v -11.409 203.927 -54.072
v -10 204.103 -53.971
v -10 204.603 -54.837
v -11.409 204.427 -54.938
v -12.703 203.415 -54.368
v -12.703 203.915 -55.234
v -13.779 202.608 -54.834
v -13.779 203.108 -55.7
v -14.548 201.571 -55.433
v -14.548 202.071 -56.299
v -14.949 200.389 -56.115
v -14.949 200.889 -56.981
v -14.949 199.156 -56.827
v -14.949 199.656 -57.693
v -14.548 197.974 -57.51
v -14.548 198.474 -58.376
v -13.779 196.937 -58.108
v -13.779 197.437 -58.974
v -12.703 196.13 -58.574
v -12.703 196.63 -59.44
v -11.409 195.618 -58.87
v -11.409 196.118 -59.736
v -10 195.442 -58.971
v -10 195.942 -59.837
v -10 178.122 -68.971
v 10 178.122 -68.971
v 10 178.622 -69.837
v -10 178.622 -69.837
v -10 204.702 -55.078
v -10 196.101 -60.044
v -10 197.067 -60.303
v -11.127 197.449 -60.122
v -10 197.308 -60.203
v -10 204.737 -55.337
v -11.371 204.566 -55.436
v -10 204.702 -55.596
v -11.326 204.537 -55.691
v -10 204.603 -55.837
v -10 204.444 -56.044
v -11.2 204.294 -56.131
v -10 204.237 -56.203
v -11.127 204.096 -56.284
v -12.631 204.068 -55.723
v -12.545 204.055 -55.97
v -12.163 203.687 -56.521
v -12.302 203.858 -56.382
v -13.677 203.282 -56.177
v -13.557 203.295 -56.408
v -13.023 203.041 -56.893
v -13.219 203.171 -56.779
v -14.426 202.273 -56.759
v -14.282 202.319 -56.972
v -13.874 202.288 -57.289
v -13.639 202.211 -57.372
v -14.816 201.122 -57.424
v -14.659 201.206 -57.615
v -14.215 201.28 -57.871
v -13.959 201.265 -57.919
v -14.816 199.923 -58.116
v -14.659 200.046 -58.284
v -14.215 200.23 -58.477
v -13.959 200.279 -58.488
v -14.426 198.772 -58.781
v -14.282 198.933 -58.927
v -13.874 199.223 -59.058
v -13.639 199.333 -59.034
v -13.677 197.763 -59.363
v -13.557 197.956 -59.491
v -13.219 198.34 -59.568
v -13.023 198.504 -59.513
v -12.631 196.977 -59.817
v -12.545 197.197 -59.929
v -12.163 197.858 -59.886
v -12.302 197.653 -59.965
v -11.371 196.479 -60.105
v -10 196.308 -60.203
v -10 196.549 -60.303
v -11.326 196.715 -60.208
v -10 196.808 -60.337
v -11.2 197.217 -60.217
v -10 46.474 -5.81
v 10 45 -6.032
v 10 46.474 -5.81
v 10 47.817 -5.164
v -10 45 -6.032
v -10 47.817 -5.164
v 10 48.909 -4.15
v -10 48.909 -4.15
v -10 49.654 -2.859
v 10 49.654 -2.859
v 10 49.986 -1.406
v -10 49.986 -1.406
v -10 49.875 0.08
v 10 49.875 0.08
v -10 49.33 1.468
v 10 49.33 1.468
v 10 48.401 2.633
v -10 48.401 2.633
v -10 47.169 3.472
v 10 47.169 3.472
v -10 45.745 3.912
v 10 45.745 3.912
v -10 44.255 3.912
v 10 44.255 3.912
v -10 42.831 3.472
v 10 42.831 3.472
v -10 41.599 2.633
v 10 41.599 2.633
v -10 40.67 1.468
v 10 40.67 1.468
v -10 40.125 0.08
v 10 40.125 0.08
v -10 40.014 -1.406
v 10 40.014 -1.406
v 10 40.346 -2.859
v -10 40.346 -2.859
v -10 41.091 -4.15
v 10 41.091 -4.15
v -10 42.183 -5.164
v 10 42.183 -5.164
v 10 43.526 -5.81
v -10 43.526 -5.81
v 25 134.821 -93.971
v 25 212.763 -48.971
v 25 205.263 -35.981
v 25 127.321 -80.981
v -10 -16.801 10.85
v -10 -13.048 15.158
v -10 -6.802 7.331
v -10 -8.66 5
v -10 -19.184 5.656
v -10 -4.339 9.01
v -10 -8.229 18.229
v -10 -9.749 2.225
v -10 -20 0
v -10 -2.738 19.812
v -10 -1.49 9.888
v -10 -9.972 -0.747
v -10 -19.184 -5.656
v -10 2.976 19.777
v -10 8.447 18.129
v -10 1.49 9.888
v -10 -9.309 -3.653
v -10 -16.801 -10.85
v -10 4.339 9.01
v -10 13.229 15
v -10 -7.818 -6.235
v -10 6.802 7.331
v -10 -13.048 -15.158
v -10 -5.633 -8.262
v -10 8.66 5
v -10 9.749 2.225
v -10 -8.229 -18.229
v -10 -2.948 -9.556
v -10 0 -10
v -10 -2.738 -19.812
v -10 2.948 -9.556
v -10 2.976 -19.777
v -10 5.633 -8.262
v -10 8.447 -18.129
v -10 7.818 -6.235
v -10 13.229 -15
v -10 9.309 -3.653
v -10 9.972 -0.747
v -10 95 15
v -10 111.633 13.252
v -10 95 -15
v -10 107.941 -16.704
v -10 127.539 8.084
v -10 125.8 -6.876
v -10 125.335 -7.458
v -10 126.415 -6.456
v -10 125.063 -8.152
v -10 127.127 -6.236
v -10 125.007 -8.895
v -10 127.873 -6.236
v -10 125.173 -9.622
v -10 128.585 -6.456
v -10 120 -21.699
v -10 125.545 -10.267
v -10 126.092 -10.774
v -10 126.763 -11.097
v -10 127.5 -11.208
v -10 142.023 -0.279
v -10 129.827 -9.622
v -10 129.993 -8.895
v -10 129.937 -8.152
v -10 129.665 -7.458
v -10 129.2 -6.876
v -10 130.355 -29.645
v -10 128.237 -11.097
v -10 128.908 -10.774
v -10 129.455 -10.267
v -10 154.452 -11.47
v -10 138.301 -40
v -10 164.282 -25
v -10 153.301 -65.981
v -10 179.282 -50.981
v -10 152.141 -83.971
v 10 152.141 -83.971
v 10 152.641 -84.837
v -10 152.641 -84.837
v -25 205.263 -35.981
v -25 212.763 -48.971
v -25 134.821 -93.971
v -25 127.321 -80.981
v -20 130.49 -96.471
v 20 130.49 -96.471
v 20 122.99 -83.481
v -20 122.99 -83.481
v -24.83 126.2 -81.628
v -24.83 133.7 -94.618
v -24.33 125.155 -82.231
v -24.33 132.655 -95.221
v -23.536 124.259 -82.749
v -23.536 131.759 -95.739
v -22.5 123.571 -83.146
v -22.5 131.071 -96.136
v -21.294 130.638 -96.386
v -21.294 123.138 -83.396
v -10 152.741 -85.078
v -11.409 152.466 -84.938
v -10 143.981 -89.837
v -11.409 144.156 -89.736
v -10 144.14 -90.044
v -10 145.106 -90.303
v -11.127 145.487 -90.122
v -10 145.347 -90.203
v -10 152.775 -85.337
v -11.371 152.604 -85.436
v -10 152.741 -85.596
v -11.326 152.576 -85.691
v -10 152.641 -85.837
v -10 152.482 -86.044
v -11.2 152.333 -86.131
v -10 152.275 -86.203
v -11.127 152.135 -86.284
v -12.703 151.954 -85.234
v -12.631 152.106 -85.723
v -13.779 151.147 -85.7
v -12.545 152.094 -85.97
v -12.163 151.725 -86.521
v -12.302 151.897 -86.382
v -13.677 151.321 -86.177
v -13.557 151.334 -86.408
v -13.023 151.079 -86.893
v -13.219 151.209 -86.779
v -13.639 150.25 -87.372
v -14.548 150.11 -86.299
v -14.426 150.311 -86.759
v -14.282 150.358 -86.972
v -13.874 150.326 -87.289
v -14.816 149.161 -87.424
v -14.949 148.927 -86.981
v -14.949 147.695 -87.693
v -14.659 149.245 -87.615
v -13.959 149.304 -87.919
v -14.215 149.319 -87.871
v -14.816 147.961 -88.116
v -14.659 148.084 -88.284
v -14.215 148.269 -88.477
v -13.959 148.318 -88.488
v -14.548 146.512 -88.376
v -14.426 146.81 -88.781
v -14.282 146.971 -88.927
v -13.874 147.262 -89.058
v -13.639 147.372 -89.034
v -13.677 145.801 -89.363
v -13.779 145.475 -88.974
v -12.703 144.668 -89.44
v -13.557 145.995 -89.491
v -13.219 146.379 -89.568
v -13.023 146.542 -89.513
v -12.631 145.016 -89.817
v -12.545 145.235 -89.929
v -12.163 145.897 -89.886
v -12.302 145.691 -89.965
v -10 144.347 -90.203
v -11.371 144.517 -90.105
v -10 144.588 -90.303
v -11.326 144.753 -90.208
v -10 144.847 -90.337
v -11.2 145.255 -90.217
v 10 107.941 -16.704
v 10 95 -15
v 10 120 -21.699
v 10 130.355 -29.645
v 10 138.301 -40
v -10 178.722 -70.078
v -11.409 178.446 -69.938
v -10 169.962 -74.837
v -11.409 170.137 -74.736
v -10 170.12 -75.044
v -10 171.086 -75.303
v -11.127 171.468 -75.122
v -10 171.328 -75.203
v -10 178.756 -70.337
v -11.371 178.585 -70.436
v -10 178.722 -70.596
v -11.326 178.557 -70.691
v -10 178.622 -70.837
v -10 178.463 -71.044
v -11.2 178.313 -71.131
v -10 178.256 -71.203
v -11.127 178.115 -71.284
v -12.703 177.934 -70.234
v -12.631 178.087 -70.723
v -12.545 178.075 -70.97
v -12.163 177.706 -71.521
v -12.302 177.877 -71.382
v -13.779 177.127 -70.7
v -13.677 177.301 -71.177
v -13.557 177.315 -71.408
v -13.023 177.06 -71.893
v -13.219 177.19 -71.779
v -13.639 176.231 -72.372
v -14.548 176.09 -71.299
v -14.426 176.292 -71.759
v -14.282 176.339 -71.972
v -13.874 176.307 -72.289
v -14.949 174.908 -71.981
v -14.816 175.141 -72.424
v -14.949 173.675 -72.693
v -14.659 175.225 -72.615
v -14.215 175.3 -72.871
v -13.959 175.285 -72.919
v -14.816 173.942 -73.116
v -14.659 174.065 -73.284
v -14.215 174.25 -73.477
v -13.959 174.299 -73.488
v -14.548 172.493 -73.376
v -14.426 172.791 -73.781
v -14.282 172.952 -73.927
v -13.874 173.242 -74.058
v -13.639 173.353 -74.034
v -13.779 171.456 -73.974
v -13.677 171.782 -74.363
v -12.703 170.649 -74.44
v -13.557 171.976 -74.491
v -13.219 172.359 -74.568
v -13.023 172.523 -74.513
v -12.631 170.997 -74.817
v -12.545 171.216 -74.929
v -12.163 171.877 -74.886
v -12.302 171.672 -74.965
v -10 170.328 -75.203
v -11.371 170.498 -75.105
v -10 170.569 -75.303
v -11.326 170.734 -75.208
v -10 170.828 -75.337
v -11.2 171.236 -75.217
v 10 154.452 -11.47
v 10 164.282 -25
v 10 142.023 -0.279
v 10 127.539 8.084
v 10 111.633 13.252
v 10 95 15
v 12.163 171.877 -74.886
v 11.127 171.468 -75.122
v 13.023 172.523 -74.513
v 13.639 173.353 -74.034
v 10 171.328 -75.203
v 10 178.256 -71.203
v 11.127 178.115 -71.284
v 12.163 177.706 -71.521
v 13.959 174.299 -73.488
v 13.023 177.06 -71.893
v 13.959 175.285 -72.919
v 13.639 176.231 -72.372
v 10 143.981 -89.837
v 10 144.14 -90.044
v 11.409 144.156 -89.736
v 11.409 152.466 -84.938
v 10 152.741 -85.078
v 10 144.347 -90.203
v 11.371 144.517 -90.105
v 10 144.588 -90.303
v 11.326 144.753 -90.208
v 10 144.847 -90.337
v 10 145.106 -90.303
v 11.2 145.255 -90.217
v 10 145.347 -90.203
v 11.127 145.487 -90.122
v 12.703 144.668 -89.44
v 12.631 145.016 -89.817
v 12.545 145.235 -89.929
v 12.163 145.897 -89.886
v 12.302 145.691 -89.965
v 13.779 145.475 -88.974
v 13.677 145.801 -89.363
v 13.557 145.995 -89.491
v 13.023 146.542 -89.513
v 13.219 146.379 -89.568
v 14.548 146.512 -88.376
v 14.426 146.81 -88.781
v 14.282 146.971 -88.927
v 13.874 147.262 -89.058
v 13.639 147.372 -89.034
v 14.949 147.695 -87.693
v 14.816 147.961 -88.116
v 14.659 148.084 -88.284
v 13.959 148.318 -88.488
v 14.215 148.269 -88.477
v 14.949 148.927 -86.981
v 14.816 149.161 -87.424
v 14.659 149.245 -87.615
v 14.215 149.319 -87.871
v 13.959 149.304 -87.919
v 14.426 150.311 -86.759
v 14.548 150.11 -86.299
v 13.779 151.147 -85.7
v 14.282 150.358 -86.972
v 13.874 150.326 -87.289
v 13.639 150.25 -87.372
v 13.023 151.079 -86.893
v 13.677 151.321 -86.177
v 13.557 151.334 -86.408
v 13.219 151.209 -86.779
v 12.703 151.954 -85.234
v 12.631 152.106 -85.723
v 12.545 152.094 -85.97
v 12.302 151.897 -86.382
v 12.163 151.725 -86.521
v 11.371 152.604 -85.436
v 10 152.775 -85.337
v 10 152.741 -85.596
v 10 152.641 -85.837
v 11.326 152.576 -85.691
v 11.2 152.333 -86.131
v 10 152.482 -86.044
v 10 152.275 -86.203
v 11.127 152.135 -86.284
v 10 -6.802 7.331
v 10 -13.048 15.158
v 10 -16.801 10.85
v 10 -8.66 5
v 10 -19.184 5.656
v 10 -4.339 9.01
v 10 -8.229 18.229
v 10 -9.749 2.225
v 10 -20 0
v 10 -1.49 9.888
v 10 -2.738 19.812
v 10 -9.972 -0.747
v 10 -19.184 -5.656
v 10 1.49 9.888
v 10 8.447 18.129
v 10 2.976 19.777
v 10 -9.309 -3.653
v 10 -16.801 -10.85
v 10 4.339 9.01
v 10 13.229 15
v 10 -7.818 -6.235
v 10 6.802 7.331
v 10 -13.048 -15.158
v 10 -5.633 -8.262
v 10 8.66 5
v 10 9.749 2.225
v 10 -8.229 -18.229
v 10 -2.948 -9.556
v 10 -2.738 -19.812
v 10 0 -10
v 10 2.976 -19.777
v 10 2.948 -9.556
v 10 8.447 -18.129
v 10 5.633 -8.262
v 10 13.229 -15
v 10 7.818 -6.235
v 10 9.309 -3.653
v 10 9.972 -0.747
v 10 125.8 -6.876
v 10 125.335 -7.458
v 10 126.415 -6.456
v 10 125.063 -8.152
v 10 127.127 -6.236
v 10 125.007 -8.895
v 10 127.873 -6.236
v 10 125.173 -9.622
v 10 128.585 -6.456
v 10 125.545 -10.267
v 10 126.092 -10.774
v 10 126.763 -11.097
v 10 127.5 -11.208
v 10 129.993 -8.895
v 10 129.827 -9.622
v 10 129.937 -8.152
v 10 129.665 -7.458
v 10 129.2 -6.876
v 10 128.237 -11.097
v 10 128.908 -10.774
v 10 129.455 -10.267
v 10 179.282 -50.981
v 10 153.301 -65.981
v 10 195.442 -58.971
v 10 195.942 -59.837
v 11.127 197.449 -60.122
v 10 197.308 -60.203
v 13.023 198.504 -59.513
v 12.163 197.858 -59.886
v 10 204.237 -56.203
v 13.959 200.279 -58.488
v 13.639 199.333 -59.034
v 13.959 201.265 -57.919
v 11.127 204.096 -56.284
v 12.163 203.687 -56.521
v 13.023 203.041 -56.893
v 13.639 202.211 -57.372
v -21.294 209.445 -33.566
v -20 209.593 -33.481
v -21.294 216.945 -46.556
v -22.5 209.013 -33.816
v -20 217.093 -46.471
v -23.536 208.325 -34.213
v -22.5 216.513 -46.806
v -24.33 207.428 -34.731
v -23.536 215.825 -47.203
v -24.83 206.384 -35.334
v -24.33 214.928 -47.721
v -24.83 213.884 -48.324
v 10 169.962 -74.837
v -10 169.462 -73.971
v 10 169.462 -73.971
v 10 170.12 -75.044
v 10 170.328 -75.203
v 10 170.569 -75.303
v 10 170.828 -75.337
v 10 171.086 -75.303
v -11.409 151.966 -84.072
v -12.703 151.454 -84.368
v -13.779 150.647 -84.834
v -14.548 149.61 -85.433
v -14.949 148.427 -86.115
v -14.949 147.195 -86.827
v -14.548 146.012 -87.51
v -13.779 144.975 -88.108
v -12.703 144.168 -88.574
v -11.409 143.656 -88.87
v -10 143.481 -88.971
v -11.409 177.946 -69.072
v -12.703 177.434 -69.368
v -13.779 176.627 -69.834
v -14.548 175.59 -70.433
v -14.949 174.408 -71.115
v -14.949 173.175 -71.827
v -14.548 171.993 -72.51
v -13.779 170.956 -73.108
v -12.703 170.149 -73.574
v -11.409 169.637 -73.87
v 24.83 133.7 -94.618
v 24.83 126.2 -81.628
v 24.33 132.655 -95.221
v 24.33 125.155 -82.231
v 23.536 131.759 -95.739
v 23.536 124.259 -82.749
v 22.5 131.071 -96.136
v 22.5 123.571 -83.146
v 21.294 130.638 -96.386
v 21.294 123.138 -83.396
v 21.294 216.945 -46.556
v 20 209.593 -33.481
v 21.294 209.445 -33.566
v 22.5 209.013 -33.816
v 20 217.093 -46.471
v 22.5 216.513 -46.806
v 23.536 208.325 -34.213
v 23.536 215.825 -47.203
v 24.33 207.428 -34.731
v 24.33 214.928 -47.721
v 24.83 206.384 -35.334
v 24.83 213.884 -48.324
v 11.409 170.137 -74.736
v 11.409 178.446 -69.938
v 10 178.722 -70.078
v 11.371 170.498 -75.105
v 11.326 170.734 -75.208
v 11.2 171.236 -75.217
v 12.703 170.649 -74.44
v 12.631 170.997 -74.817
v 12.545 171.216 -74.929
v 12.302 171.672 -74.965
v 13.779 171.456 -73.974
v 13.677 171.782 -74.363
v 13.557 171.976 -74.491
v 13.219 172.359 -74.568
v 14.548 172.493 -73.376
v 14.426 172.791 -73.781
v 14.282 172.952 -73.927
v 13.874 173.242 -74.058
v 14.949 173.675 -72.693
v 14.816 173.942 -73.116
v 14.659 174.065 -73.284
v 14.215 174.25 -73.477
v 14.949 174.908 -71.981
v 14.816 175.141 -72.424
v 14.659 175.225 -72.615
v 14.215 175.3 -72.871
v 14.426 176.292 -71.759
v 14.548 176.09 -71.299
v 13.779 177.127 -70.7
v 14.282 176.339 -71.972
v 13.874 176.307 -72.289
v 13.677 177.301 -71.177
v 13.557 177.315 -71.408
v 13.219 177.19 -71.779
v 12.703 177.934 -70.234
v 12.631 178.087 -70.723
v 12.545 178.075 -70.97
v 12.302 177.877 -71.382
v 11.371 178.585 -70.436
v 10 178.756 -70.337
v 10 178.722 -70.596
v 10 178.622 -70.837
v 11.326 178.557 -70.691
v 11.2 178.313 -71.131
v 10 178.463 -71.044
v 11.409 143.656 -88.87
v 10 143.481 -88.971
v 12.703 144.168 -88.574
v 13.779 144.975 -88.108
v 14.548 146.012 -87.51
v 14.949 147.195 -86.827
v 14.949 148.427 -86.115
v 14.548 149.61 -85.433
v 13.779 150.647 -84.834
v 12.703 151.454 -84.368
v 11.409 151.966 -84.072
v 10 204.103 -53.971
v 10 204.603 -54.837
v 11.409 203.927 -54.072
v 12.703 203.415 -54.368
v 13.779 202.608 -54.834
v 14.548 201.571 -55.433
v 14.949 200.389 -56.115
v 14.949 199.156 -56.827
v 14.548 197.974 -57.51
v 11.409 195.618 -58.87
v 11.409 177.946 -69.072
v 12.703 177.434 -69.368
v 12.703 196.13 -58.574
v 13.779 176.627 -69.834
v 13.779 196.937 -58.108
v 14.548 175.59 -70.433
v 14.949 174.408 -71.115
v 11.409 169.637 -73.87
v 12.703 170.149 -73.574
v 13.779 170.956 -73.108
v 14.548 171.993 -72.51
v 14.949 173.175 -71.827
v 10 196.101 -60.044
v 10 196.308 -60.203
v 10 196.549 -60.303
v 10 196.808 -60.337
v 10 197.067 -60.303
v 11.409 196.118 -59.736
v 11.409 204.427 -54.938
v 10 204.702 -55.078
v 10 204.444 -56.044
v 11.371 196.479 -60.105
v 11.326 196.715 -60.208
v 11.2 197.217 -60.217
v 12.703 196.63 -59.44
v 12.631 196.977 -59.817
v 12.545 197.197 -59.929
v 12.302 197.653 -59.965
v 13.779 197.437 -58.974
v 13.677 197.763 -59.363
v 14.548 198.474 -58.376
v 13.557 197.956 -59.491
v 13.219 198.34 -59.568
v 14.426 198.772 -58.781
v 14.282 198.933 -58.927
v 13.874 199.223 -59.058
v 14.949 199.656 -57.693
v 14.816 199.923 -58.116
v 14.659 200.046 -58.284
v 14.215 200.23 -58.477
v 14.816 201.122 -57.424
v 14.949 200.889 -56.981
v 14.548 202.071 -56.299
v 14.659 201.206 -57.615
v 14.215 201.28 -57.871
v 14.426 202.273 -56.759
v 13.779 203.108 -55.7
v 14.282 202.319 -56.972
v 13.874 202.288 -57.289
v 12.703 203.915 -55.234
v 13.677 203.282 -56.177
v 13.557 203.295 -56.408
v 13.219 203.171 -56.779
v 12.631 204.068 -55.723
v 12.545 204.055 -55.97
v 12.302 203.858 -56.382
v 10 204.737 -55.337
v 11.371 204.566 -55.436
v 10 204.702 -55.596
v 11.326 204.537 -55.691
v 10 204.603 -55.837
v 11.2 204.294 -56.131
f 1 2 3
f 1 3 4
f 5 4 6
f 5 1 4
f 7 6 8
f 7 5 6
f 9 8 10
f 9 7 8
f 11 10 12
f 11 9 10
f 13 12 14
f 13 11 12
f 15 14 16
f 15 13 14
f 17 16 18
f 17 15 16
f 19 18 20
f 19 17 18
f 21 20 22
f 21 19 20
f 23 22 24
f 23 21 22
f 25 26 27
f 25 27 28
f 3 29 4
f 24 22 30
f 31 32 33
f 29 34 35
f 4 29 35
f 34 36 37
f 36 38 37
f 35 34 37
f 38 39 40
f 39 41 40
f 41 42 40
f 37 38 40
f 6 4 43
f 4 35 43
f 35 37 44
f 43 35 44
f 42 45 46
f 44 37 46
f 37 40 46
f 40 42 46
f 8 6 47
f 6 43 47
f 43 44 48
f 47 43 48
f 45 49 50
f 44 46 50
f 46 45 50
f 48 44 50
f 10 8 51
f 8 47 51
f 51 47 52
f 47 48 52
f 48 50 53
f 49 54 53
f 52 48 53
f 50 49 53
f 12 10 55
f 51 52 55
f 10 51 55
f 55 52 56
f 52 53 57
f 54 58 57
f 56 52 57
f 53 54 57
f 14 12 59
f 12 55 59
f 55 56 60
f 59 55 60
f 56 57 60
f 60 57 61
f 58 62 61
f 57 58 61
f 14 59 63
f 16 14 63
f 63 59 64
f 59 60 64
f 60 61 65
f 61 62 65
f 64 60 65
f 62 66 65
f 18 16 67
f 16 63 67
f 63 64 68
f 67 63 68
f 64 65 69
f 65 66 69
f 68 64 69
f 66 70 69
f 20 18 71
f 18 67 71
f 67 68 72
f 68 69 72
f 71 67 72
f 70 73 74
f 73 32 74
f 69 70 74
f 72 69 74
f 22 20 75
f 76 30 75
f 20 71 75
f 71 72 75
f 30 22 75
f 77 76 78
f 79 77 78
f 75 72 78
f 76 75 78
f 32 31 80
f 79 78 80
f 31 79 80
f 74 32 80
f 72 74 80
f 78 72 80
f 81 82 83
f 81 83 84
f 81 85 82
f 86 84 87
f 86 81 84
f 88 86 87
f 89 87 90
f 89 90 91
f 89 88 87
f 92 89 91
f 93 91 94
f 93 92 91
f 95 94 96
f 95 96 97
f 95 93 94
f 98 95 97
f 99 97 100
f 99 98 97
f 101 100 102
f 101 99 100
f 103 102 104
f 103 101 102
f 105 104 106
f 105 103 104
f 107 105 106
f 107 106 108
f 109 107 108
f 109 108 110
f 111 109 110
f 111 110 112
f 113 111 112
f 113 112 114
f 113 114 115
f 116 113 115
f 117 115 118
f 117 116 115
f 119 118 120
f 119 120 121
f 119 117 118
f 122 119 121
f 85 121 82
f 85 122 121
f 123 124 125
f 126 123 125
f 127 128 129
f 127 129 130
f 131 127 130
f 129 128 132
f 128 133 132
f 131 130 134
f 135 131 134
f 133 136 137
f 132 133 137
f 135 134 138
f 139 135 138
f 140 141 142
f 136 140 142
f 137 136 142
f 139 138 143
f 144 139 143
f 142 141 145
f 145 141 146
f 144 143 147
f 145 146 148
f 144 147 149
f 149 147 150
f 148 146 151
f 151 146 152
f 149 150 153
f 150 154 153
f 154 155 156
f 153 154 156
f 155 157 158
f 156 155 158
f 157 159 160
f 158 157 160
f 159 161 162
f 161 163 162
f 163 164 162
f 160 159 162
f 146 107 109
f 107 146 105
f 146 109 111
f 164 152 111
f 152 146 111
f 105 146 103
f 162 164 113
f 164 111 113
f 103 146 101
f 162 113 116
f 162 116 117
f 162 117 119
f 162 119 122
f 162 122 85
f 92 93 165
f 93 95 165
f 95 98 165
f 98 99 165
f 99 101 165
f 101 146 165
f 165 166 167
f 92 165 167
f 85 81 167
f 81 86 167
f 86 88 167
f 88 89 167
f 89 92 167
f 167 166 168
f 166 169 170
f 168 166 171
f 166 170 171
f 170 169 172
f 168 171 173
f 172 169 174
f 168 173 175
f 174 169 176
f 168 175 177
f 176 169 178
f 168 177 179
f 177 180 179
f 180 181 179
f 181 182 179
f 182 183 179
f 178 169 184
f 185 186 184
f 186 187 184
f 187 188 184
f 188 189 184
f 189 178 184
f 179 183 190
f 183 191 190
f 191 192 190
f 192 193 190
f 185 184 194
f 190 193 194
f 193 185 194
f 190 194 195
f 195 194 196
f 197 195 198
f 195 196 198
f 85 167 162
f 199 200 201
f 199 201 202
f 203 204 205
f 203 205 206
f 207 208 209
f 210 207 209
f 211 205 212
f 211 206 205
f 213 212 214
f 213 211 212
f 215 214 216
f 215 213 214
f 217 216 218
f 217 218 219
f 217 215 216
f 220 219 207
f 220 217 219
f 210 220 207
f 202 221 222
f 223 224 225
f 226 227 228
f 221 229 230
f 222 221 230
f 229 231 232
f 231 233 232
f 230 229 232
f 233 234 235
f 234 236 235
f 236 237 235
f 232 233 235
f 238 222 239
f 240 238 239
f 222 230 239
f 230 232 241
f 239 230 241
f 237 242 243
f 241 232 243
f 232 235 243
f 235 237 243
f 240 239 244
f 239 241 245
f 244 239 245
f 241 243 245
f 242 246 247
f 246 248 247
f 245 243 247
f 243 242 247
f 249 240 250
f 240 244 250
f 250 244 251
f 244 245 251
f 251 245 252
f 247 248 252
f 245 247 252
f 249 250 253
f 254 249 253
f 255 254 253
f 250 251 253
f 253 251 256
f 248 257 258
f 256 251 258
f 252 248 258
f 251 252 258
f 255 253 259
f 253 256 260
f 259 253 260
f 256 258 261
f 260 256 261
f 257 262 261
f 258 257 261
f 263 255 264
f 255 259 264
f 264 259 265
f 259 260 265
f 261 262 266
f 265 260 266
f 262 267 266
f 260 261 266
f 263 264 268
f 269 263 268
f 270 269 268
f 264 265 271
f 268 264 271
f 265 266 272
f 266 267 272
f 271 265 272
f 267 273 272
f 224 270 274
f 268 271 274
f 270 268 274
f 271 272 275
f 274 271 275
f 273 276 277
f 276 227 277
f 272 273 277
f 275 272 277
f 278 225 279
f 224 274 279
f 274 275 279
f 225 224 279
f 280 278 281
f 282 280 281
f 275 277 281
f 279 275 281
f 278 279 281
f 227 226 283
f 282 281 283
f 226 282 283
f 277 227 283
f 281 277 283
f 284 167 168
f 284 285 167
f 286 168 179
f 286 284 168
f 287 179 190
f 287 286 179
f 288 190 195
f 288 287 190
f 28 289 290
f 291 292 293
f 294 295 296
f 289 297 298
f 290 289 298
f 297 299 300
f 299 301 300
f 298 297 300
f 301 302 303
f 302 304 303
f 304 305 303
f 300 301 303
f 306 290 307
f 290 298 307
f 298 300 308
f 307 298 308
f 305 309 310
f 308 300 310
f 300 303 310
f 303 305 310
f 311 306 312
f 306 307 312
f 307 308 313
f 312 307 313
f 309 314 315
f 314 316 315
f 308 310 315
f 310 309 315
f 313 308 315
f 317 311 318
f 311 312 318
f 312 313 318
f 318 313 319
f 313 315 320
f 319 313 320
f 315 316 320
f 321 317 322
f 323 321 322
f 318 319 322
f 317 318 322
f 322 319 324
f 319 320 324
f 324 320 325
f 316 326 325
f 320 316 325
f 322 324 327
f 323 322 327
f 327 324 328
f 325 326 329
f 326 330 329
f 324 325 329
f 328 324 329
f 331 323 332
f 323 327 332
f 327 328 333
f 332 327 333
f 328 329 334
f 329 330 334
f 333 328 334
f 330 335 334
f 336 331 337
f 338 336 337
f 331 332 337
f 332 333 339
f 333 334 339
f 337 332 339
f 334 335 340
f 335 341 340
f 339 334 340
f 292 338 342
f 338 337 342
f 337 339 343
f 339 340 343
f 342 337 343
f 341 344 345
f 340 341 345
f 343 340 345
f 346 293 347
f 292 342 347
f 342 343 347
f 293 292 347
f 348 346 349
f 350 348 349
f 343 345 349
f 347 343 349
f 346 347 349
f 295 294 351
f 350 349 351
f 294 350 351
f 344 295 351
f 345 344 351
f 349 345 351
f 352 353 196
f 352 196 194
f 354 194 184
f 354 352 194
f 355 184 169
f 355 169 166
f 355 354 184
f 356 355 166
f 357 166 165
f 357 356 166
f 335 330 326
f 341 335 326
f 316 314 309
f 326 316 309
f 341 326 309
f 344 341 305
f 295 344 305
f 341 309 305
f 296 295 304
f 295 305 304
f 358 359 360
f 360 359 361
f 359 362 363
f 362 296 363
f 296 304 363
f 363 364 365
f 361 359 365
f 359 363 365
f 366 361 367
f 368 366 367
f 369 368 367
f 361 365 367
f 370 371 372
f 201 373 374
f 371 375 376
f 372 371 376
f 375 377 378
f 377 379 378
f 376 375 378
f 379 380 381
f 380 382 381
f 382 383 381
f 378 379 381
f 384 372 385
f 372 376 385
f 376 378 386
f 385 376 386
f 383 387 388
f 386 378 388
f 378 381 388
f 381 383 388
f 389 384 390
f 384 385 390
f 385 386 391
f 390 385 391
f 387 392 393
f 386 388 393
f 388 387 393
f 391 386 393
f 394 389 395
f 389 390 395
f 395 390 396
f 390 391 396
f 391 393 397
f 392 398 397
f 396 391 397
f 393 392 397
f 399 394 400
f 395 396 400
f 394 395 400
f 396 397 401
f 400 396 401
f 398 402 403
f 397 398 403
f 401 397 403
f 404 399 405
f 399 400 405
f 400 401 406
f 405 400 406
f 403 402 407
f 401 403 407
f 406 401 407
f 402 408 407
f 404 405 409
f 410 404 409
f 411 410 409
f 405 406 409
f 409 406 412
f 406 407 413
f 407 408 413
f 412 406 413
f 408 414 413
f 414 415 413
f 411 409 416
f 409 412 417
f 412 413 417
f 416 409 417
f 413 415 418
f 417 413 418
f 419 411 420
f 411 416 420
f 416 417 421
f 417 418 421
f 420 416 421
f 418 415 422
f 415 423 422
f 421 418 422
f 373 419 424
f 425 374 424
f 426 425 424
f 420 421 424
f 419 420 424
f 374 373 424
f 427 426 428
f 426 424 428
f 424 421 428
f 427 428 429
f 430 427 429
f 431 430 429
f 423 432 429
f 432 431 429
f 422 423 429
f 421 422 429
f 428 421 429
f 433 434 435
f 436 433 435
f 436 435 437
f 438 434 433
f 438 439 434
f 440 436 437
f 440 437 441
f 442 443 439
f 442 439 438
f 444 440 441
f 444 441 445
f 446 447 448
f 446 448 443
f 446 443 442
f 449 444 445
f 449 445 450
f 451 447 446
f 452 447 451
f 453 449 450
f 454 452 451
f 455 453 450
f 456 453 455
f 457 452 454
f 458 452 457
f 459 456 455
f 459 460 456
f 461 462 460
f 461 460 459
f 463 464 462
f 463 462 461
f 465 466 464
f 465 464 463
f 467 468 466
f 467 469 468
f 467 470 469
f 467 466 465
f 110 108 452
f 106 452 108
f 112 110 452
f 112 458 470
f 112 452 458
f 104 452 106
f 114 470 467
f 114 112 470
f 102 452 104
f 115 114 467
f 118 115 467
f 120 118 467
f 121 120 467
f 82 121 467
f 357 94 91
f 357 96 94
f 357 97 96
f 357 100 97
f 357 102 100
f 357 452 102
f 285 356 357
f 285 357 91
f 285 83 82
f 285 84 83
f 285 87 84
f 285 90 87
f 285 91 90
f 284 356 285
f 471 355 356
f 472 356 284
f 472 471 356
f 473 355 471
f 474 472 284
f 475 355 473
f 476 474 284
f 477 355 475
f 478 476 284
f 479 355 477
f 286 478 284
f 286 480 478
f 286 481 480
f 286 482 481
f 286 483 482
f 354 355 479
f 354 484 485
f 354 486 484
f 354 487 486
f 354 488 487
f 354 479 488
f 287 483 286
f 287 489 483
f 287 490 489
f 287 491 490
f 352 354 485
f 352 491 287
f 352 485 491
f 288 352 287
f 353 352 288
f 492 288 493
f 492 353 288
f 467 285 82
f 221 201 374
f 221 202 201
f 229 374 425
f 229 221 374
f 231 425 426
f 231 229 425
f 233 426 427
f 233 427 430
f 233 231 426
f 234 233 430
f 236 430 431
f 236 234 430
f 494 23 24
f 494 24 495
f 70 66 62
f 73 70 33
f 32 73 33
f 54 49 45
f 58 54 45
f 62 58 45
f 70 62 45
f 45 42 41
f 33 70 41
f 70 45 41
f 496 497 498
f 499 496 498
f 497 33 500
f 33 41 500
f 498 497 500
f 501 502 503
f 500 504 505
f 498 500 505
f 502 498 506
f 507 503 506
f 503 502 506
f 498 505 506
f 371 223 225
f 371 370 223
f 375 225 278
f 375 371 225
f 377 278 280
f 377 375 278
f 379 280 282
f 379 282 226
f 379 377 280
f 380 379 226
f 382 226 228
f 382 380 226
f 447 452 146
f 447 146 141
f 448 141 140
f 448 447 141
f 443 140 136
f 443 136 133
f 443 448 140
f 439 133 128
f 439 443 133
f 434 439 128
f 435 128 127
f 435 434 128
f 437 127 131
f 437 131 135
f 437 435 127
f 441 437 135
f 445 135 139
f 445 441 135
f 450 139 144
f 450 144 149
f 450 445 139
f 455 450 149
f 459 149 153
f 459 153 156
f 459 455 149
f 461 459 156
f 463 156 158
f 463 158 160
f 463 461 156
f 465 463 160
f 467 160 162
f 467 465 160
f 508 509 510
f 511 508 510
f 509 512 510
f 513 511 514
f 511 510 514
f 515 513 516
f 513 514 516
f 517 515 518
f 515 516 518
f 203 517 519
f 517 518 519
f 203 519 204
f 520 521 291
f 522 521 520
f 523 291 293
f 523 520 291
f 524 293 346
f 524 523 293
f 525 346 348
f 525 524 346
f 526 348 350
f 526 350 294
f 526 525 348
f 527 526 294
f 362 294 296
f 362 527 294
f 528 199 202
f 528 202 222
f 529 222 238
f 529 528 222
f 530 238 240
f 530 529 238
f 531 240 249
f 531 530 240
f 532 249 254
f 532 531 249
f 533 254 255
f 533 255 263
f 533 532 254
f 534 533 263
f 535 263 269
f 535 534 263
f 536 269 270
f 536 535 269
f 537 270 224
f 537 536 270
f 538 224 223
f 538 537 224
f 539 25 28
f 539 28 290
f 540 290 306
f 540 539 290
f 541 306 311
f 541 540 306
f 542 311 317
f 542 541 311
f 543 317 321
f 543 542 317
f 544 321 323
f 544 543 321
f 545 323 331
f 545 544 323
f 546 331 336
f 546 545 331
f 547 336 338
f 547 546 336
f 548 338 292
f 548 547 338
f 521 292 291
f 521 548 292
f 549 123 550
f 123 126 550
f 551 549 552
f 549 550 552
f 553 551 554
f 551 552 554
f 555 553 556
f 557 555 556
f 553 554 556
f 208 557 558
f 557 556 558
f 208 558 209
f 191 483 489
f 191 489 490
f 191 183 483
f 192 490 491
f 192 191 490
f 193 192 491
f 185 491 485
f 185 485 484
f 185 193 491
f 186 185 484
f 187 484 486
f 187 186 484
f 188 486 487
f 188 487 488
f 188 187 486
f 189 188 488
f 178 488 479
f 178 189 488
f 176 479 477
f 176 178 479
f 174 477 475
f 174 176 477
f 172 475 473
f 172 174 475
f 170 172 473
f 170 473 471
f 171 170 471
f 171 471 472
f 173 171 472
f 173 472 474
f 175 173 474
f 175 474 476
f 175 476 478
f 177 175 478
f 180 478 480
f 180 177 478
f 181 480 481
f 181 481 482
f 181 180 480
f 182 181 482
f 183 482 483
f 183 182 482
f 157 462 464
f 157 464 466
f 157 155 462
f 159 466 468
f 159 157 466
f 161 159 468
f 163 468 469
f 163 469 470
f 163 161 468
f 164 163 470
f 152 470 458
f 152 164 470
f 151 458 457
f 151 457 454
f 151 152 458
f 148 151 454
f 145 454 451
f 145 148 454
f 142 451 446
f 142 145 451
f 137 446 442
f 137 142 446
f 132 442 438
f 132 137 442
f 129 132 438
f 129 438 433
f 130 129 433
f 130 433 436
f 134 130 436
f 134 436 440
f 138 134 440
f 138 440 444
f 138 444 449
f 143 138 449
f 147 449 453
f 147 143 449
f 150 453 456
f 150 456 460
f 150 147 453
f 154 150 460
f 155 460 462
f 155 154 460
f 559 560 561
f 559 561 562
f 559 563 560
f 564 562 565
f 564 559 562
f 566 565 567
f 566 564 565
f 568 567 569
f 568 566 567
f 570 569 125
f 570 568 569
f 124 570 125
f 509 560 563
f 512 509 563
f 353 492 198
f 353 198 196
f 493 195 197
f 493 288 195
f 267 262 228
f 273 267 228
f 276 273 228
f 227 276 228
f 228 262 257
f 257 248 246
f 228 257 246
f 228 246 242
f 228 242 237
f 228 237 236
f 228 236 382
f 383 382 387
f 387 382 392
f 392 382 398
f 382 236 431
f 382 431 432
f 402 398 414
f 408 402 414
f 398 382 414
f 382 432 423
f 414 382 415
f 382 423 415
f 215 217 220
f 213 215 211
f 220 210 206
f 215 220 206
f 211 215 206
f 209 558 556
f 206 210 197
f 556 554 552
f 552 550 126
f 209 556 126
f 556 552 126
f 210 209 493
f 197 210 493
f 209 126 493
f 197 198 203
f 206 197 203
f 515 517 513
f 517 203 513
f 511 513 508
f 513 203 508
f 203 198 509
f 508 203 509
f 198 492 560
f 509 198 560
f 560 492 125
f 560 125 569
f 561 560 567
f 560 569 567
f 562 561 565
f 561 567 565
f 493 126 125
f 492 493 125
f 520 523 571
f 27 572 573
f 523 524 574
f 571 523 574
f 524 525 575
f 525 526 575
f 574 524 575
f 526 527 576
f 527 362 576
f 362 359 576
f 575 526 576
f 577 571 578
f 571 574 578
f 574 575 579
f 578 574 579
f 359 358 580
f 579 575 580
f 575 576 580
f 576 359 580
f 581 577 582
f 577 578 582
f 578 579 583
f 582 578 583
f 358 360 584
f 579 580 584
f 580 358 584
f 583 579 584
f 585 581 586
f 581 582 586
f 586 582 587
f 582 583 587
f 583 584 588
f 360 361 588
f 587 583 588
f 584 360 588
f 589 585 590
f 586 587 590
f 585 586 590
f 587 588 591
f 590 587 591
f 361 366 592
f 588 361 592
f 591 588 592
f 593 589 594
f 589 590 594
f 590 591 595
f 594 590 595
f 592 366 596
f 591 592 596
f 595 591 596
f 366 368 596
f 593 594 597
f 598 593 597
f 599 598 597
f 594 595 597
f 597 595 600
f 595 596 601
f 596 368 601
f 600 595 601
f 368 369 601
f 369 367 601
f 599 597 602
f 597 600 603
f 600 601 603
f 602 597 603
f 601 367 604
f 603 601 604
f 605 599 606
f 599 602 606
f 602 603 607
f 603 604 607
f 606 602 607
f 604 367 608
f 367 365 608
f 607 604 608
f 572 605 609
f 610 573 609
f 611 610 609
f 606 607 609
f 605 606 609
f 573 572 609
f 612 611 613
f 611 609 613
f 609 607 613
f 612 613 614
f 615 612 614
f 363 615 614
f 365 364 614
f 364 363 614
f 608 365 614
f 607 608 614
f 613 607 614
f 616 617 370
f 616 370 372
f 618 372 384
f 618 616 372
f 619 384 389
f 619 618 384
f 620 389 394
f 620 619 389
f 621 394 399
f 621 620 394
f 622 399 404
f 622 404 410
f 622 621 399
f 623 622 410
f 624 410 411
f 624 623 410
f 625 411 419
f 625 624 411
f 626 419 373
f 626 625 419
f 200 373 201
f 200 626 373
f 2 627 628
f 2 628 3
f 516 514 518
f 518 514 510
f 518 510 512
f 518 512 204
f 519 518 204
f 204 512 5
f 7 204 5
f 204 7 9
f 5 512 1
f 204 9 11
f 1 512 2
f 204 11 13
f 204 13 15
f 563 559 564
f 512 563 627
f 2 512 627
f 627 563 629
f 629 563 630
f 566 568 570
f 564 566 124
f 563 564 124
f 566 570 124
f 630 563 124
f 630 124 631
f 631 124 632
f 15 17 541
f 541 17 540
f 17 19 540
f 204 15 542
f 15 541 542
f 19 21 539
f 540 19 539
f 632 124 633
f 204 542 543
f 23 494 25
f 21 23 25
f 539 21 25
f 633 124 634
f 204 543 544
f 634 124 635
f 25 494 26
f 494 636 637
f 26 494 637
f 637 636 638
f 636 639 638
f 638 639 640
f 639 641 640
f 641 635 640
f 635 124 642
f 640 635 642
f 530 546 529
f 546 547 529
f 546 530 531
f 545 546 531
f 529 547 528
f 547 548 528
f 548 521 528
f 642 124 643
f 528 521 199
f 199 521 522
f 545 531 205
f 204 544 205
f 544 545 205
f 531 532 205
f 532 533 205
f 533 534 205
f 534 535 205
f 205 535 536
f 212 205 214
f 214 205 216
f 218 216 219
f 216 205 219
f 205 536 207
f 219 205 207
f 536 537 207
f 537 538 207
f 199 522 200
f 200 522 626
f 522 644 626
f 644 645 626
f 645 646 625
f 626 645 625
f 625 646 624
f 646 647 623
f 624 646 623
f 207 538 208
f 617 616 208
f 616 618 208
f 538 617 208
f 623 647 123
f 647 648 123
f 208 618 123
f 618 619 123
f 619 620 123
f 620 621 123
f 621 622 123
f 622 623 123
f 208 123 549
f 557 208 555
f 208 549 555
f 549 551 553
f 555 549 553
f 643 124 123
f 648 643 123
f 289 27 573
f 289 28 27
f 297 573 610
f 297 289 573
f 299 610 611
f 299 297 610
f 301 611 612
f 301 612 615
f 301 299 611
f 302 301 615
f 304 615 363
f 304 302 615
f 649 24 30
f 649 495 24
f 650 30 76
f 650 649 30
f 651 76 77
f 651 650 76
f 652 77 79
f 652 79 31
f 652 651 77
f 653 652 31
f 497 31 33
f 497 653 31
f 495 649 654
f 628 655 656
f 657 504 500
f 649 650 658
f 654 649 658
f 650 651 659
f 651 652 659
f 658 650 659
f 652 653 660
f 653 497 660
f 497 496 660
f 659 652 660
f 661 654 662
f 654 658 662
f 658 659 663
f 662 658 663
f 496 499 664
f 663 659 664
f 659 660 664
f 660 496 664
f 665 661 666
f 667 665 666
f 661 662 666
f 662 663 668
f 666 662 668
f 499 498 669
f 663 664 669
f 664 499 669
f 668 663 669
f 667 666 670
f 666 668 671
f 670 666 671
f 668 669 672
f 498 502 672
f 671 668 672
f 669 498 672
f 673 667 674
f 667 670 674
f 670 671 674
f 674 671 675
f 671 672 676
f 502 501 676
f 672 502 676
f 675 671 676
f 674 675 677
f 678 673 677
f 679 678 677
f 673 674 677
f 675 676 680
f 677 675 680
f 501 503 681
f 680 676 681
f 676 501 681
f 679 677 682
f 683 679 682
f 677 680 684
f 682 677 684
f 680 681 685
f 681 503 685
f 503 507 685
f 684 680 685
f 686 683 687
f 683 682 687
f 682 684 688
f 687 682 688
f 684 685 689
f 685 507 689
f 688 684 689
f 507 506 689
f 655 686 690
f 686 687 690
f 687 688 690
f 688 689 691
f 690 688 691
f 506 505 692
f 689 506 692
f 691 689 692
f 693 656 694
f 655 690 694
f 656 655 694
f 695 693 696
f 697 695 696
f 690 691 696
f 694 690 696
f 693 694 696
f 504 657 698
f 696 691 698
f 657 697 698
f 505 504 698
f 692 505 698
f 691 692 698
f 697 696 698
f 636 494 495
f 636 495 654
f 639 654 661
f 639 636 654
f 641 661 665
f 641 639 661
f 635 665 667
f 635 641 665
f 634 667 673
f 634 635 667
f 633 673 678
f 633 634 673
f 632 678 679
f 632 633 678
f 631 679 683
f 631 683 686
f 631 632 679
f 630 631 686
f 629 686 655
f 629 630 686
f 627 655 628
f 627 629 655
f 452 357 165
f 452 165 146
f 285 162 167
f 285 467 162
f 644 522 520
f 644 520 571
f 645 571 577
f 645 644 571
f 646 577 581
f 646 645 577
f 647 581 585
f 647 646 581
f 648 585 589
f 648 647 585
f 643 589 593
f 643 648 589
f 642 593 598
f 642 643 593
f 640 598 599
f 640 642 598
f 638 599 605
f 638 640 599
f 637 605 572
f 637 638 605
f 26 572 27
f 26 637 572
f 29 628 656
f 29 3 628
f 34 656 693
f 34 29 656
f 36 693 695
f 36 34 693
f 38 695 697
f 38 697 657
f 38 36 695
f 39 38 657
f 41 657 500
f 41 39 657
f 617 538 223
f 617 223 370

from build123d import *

# Parameters (mm, degrees)
SKETCH3_R           = 10
SKETCH3_R_2         = 5
SKETCH3_R_3         = 2.5
BOSS_EXTRUDE1_DEPTH = 10
BOSS_EXTRUDE2_DEPTH = 25
FILLET1_R           = 5
BOSS_EXTRUDE3_DEPTH = 2
FILLET5_R           = 1


with BuildPart() as part:
    # Sketch3 → Boss-Extrude1 (new, symmetric)
    with BuildSketch(Plane(origin=(0, 0, 0), x_dir=(0, 0, -1), z_dir=(1, 0, 0))):
        with BuildLine():
            Line((65.980762114, 153.301270189), (50.980762114, 179.282032303))
            Line((50.980762114, 179.282032303), (25, 164.282032303))
            ThreePointArc((25, 164.282032303), (-4.282032303, 135), (-15, 95))
            Line((-15, 95), (-15, 13.228756555))
            ThreePointArc((-15, 13.228756555), (0, -20), (15, 13.228756555))
            Line((15, 13.228756555), (15, 95))
            ThreePointArc((15, 95), (21.698729811, 120), (40, 138.301270189))
            Line((40, 138.301270189), (65.980762114, 153.301270189))
        make_face()
        Circle(SKETCH3_R, mode=Mode.SUBTRACT)
        with Locations((1.032464383, 45)):
            Circle(SKETCH3_R_2, mode=Mode.SUBTRACT)
        with Locations((8.708348754, 127.5)):
            Circle(SKETCH3_R_3, mode=Mode.SUBTRACT)
    extrude(amount=BOSS_EXTRUDE1_DEPTH, both=True)

    # Sketch3<3> → Boss-Extrude2 (add, symmetric)
    with BuildSketch(Plane(origin=(0, 0, 0), x_dir=(0, 0, -1), z_dir=(1, 0, 0))):
        Polygon((96.47114317, 130.490381057), (46.47114317, 217.092921435), (33.480762114, 209.592921435), (50.980762114, 179.282032303), (65.980762114, 153.301270189), (83.480762114, 122.990381057), align=None)
    extrude(amount=BOSS_EXTRUDE2_DEPTH, both=True)

    # Fillet1
    fillet1_edges = [part.edges().sort_by_distance(p)[0] for p in [
        (25, 213.342921435, -39.975952642),
        (-25, 213.342921435, -39.975952642),
        (-25, 126.740381057, -89.975952642),
        (25, 126.740381057, -89.975952642),
    ]]
    fillet(fillet1_edges, radius=FILLET1_R)

    # Sketch5 → Boss-Extrude3 (add)
    with BuildSketch(Plane(origin=(0, 74.395825623, -128.85734985), x_dir=(-1, 0, 0), z_dir=(0, 0.4999999999999982, -0.8660254037844396))):
        with BuildLine():
            Line((-10, 149.77241336), (10, 149.77241336))
            ThreePointArc((10, 149.77241336), (15, 144.77241336), (10, 139.77241336))
            Line((10, 139.77241336), (-10, 139.77241336))
            ThreePointArc((-10, 139.77241336), (-15, 144.77241336), (-10, 149.77241336))
        make_face()
        with BuildLine():
            Line((-10, 119.77241336), (10, 119.77241336))
            ThreePointArc((10, 119.77241336), (15, 114.77241336), (10, 109.77241336))
            Line((10, 109.77241336), (-10, 109.77241336))
            ThreePointArc((-10, 109.77241336), (-15, 114.77241336), (-10, 119.77241336))
        make_face()
        with BuildLine():
            Line((-10, 89.77241336), (10, 89.77241336))
            ThreePointArc((10, 89.77241336), (15, 84.77241336), (10, 79.77241336))
            Line((10, 79.77241336), (-10, 79.77241336))
            ThreePointArc((-10, 79.77241336), (-15, 84.77241336), (-10, 89.77241336))
        make_face()
    extrude(amount=BOSS_EXTRUDE3_DEPTH)

    # Fillet5
    fillet5_edges = [part.edges().sort_by_distance(p)[0] for p in [
        (15, 174.791651246, -73.203193978),
        (0, 179.121778265, -70.703193978),
        (-15, 174.791651246, -73.203193978),
        (15, 200.77241336, -58.203193978),
        (0, 205.102540378, -55.703193978),
        (-15, 200.77241336, -58.203193978),
        (0, 153.141016151, -85.703193978),
        (-15, 148.810889132, -88.203193978),
        (0, 144.480762114, -90.703193978),
        (15, 148.810889132, -88.203193978),
        (0, 170.461524227, -75.703193978),
        (0, 196.442286341, -60.703193978),
    ]]
    fillet(fillet5_edges, radius=FILLET5_R)


solid = part.part
